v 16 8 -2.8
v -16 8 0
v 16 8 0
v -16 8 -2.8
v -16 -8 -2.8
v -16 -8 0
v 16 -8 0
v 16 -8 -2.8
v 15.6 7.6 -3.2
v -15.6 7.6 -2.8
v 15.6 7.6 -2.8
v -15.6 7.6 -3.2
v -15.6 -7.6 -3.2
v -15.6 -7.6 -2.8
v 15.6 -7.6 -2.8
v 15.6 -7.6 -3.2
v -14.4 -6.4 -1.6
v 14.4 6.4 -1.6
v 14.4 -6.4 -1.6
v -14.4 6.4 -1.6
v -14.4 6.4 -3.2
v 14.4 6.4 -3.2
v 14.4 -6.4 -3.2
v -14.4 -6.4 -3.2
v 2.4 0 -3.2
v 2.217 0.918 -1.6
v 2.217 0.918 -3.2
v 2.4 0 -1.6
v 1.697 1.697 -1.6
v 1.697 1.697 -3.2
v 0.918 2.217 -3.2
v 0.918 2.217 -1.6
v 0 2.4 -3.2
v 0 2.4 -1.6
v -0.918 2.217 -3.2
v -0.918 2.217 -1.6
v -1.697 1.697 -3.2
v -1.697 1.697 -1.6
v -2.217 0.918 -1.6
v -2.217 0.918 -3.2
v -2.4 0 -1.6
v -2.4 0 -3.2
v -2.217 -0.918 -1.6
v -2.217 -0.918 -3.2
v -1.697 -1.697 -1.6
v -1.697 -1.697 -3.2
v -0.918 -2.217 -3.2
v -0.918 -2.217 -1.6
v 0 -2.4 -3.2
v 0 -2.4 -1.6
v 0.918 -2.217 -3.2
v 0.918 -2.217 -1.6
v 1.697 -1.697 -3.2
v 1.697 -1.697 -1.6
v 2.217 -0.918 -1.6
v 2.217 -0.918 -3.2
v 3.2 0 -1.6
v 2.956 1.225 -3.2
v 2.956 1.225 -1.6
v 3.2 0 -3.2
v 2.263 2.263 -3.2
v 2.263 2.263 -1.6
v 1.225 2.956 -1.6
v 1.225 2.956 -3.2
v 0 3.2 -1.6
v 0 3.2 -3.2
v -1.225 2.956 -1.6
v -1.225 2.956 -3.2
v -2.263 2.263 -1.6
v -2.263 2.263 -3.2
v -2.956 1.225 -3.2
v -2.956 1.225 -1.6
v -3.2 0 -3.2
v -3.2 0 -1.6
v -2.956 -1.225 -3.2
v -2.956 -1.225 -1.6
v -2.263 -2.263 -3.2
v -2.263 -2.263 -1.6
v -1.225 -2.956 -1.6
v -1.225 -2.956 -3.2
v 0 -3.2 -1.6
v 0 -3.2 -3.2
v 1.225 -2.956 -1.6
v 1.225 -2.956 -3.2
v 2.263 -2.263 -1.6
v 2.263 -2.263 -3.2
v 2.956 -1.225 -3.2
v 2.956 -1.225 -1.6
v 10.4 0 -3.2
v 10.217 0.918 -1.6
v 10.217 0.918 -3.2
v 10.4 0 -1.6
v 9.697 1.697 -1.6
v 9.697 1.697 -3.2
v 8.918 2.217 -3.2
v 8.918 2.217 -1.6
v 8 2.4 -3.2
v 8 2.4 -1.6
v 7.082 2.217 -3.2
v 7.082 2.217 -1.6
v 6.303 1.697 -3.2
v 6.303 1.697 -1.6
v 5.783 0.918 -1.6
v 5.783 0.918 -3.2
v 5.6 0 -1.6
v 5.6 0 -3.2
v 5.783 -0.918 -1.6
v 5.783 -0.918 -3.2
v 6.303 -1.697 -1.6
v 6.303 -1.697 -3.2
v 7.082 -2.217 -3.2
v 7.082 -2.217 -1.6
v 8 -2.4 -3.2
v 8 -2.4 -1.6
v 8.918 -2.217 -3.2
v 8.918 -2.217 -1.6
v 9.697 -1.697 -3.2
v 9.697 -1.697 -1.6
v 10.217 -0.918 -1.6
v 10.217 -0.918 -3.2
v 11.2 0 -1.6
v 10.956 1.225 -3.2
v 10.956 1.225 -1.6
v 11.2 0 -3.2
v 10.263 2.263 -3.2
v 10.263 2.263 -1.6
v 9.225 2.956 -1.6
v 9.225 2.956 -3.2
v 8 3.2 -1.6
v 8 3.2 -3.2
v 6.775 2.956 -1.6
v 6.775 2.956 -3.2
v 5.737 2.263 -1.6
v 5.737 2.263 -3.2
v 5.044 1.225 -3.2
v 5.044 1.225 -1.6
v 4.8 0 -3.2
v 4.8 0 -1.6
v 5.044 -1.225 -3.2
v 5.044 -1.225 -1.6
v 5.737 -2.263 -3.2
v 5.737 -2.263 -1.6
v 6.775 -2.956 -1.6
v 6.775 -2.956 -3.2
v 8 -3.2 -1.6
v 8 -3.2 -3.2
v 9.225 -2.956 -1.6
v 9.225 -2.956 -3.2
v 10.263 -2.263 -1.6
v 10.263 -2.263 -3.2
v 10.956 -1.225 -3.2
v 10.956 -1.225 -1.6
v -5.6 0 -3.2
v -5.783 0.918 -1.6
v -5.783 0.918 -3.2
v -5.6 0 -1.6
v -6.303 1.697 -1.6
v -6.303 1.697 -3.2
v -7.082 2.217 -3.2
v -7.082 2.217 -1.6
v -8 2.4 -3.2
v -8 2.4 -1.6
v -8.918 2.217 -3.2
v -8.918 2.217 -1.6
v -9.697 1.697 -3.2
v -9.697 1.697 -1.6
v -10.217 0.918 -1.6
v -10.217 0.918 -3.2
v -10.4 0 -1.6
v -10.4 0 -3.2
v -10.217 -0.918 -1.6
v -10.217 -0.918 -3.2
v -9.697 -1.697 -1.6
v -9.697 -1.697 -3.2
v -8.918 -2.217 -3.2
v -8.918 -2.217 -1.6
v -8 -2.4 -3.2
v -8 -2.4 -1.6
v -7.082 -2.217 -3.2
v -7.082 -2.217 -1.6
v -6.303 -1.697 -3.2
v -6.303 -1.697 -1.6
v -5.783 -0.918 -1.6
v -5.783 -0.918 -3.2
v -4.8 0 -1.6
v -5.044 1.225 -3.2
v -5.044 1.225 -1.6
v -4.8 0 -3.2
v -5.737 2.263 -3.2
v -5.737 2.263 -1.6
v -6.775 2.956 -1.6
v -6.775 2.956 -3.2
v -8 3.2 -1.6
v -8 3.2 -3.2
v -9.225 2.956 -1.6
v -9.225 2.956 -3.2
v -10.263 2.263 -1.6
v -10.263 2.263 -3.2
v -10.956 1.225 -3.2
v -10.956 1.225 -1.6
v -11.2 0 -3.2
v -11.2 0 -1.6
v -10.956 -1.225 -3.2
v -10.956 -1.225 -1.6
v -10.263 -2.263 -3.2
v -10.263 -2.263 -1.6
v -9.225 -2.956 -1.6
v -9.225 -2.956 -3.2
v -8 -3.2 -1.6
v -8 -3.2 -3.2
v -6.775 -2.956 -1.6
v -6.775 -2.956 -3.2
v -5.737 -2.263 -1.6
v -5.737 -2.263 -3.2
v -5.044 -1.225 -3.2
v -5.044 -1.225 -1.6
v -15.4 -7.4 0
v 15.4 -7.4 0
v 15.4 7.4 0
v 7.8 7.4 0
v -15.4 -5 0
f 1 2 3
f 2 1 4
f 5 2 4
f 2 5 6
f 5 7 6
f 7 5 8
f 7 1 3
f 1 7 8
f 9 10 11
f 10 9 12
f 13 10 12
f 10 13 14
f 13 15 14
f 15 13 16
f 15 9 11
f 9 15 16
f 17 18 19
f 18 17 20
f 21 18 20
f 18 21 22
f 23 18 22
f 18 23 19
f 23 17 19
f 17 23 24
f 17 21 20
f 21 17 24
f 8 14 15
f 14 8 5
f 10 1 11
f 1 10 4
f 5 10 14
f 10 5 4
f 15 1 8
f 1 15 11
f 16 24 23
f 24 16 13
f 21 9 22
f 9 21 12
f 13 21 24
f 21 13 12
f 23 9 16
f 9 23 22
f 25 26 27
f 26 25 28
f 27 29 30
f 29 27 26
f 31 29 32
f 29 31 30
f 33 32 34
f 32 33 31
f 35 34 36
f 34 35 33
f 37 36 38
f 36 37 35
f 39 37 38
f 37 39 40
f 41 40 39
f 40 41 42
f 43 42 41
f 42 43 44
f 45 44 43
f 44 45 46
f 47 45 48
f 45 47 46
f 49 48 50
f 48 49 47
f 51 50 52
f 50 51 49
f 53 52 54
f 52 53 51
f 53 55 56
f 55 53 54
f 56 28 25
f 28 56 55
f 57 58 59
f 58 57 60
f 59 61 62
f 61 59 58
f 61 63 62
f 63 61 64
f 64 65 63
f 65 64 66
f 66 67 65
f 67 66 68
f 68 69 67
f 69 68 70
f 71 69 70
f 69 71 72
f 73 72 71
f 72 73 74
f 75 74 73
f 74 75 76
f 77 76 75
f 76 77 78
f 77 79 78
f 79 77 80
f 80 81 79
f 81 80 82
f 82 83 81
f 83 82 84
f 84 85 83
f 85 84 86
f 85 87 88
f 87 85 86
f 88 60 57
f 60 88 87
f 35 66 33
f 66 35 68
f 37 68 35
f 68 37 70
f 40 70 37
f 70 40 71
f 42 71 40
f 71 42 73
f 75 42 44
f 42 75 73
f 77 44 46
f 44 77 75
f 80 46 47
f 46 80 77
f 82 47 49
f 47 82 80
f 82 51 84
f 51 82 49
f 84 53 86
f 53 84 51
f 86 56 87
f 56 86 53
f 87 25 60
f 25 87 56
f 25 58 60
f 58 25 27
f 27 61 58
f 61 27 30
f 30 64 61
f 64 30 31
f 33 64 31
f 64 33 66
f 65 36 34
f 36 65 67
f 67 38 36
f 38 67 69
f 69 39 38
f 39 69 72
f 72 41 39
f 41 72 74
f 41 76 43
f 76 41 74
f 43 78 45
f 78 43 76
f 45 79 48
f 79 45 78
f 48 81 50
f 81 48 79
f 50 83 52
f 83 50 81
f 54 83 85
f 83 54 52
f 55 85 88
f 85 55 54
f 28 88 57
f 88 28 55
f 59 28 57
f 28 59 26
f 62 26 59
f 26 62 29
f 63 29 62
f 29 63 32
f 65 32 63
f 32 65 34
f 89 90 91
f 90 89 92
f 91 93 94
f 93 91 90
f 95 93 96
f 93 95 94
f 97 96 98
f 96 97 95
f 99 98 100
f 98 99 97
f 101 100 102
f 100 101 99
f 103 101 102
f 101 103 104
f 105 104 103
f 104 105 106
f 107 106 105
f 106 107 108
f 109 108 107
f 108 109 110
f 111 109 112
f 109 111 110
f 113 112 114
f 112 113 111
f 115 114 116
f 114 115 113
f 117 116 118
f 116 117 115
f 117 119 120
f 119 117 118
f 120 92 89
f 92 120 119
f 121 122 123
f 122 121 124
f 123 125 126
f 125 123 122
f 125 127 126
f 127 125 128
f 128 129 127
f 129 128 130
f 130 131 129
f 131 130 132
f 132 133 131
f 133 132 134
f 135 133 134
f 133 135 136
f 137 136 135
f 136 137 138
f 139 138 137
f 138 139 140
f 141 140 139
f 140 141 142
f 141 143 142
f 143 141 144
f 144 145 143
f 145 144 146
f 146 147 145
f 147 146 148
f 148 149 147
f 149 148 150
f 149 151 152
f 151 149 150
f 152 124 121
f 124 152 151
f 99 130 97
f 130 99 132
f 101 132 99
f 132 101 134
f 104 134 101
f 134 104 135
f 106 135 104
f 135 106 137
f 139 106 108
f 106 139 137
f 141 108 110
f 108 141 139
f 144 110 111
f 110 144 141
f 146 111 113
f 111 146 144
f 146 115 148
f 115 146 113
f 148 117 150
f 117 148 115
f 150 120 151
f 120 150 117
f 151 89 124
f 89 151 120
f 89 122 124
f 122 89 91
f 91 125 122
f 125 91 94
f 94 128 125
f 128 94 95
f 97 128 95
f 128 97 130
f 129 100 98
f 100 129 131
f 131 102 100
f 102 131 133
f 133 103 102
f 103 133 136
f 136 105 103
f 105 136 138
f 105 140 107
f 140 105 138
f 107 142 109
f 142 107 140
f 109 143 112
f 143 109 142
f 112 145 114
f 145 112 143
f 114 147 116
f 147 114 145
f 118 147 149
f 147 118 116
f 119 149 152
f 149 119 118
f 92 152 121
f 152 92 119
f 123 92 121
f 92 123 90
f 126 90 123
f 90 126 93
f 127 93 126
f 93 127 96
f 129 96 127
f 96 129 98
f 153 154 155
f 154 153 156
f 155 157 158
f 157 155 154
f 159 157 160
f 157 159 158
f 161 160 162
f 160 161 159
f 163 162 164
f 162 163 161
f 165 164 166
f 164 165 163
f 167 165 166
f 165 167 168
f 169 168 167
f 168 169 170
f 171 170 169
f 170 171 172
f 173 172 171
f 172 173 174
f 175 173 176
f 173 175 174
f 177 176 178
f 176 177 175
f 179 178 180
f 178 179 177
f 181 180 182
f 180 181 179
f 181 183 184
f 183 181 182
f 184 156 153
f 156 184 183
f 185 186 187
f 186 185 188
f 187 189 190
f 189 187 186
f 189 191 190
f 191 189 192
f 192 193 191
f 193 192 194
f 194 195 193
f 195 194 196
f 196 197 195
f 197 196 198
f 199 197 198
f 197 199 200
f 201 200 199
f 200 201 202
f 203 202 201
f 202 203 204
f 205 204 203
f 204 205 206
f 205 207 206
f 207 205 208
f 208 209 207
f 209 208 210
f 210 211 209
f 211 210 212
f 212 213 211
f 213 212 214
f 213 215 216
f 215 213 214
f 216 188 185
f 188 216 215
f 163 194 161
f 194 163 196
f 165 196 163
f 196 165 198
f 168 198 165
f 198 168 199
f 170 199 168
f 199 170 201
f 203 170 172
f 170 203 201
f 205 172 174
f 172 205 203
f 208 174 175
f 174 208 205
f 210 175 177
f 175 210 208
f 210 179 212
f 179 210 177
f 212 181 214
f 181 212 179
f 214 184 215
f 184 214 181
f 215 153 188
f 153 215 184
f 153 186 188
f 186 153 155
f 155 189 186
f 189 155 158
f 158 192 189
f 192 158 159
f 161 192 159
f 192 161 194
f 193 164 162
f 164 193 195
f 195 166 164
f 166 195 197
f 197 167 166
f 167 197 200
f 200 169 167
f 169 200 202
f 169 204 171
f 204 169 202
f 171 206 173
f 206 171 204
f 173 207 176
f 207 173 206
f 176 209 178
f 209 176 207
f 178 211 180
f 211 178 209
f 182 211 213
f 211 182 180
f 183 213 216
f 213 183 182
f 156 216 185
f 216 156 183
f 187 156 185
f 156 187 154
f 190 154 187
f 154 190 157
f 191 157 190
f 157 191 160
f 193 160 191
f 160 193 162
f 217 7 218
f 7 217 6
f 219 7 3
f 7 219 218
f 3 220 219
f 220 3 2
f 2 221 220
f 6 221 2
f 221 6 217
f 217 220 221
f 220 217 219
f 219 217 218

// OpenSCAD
// file: ../p/4-4ring3.scad
use <../lib.scad>
$fa=1; $fs=0.2;
function ldraw_lib__4_4ring3(realsolid=false) = [
// 0 Ring  3 x 1.0
// 0 Name: 4-4ring3.dat
// 0 Author: James Jessiman
// 0 !LDRAW_ORG Primitive UPDATE 2009-01
// 0 !LICENSE Licensed under CC BY 2.0 and CC BY 4.0 : see CAreadme.txt
// 
// 0 BFC CERTIFY CCW
  [0,"BFC","CERTIFY"],
  [0,"BFC","CCW"],
// 
// 0 !HISTORY 1998-12-15 [PTadmin] Official Update 1998-10
// 0 !HISTORY 2002-04-05 [hafhead] Added BFC statement
// 0 !HISTORY 2002-04-25 [PTadmin] Official Update 2002-02
// 0 !HISTORY 2007-06-24 [PTadmin] Header formatted for Contributor Agreement
// 0 !HISTORY 2008-07-01 [PTadmin] Official Update 2008-01
// 0 !HISTORY 2008-08-26 [cwdee] Switch polygon winding and rename
// 0 !HISTORY 2009-05-02 [PTadmin] Official Update 2009-01
// 
// 
// 4 16 -1.5308 0 3.6956 -1.1481 0 2.7717 0 0 3 0 0 4
  [4,16,-1.5308,0,3.6956,-1.1481,0,2.7717,0,0,3,0,0,4],
// 4 16 -2.8284 0 2.8284 -2.1213 0 2.1213 -1.1481 0 2.7717 -1.5308 0 3.6956
  [4,16,-2.8284,0,2.8284,-2.1213,0,2.1213,-1.1481,0,2.7717,-1.5308,0,3.6956],
// 4 16 -3.6956 0 1.5308 -2.7717 0 1.1481 -2.1213 0 2.1213 -2.8284 0 2.8284
  [4,16,-3.6956,0,1.5308,-2.7717,0,1.1481,-2.1213,0,2.1213,-2.8284,0,2.8284],
// 4 16 -4 0 0 -3 0 0 -2.7717 0 1.1481 -3.6956 0 1.5308
  [4,16,-4,0,0,-3,0,0,-2.7717,0,1.1481,-3.6956,0,1.5308],
// 4 16 -3.6956 0 -1.5308 -2.7717 0 -1.1481 -3 0 0 -4 0 0
  [4,16,-3.6956,0,-1.5308,-2.7717,0,-1.1481,-3,0,0,-4,0,0],
// 4 16 -2.8284 0 -2.8284 -2.1213 0 -2.1213 -2.7717 0 -1.1481 -3.6956 0 -1.5308
  [4,16,-2.8284,0,-2.8284,-2.1213,0,-2.1213,-2.7717,0,-1.1481,-3.6956,0,-1.5308],
// 4 16 -1.5308 0 -3.6956 -1.1481 0 -2.7717 -2.1213 0 -2.1213 -2.8284 0 -2.8284
  [4,16,-1.5308,0,-3.6956,-1.1481,0,-2.7717,-2.1213,0,-2.1213,-2.8284,0,-2.8284],
// 4 16 0 0 -4 0 0 -3 -1.1481 0 -2.7717 -1.5308 0 -3.6956
  [4,16,0,0,-4,0,0,-3,-1.1481,0,-2.7717,-1.5308,0,-3.6956],
// 4 16 1.5308 0 -3.6956 1.1481 0 -2.7717 0 0 -3 0 0 -4
  [4,16,1.5308,0,-3.6956,1.1481,0,-2.7717,0,0,-3,0,0,-4],
// 4 16 2.8284 0 -2.8284 2.1213 0 -2.1213 1.1481 0 -2.7717 1.5308 0 -3.6956
  [4,16,2.8284,0,-2.8284,2.1213,0,-2.1213,1.1481,0,-2.7717,1.5308,0,-3.6956],
// 4 16 3.6956 0 -1.5308 2.7717 0 -1.1481 2.1213 0 -2.1213 2.8284 0 -2.8284
  [4,16,3.6956,0,-1.5308,2.7717,0,-1.1481,2.1213,0,-2.1213,2.8284,0,-2.8284],
// 4 16 4 0 0 3 0 0 2.7717 0 -1.1481 3.6956 0 -1.5308
  [4,16,4,0,0,3,0,0,2.7717,0,-1.1481,3.6956,0,-1.5308],
// 4 16 3.6956 0 1.5308 2.7717 0 1.1481 3 0 0 4 0 0
  [4,16,3.6956,0,1.5308,2.7717,0,1.1481,3,0,0,4,0,0],
// 4 16 2.8284 0 2.8284 2.1213 0 2.1213 2.7717 0 1.1481 3.6956 0 1.5308
  [4,16,2.8284,0,2.8284,2.1213,0,2.1213,2.7717,0,1.1481,3.6956,0,1.5308],
// 4 16 1.5308 0 3.6956 1.1481 0 2.7717 2.1213 0 2.1213 2.8284 0 2.8284
  [4,16,1.5308,0,3.6956,1.1481,0,2.7717,2.1213,0,2.1213,2.8284,0,2.8284],
// 4 16 0 0 4 0 0 3 1.1481 0 2.7717 1.5308 0 3.6956
  [4,16,0,0,4,0,0,3,1.1481,0,2.7717,1.5308,0,3.6956],
// 0
];
module ldraw_lib__4_4ring3(step=0, col=false, unit=2/5, alt=false, line=0.2, solid=!$preview)
    makepoly(ldraw_lib__4_4ring3(solid), step=step, col=col, unit=unit, alt=alt, line=line, solid=solid);
ldraw_lib__4_4ring3(line=0.2);
// file: ../p/4-4edge.scad
use <../lib.scad>
function ldraw_lib__4_4edge() = [
// 0 Circle 1.0
// 0 Name: 4-4edge.dat
// 0 Author: James Jessiman
// 0 !LDRAW_ORG Primitive UPDATE 2017-01
// 0 !LICENSE Licensed under CC BY 2.0 and CC BY 4.0 : see CAreadme.txt
// 
// 0 BFC CERTIFY CCW
  [0,"BFC","CERTIFY"],
  [0,"BFC","CCW"],
// 
// 0 !HISTORY 1998-12-15 [PTadmin] Official Update 1998-10
// 0 !HISTORY 2005-12-28 [PTadmin] Official Update 2005-01
// 0 !HISTORY 2007-06-24 [PTadmin] Header formatted for Contributor Agreement
// 0 !HISTORY 2008-07-01 [PTadmin] Official Update 2008-01
// 0 !HISTORY 2017-01-15 [Steffen] BFCed
// 0 !HISTORY 2017-12-30 [PTadmin] Official Update 2017-01
// 
// 
// 2 24 1 0 0 0.9239 0 0.3827
  [2,24,1,0,0,0.9239,0,0.3827],
// 2 24 0.9239 0 0.3827 0.7071 0 0.7071
  [2,24,0.9239,0,0.3827,0.7071,0,0.7071],
// 2 24 0.7071 0 0.7071 0.3827 0 0.9239
  [2,24,0.7071,0,0.7071,0.3827,0,0.9239],
// 2 24 0.3827 0 0.9239 0 0 1
  [2,24,0.3827,0,0.9239,0,0,1],
// 2 24 0 0 1 -0.3827 0 0.9239
  [2,24,0,0,1,-0.3827,0,0.9239],
// 2 24 -0.3827 0 0.9239 -0.7071 0 0.7071
  [2,24,-0.3827,0,0.9239,-0.7071,0,0.7071],
// 2 24 -0.7071 0 0.7071 -0.9239 0 0.3827
  [2,24,-0.7071,0,0.7071,-0.9239,0,0.3827],
// 2 24 -0.9239 0 0.3827 -1 0 -0
  [2,24,-0.9239,0,0.3827,-1,0,-0],
// 2 24 -1 0 -0 -0.9239 0 -0.3827
  [2,24,-1,0,-0,-0.9239,0,-0.3827],
// 2 24 -0.9239 0 -0.3827 -0.7071 0 -0.7071
  [2,24,-0.9239,0,-0.3827,-0.7071,0,-0.7071],
// 2 24 -0.7071 0 -0.7071 -0.3827 0 -0.9239
  [2,24,-0.7071,0,-0.7071,-0.3827,0,-0.9239],
// 2 24 -0.3827 0 -0.9239 0 0 -1
  [2,24,-0.3827,0,-0.9239,0,0,-1],
// 2 24 0 0 -1 0.3827 0 -0.9239
  [2,24,0,0,-1,0.3827,0,-0.9239],
// 2 24 0.3827 0 -0.9239 0.7071 0 -0.7071
  [2,24,0.3827,0,-0.9239,0.7071,0,-0.7071],
// 2 24 0.7071 0 -0.7071 0.9239 0 -0.3827
  [2,24,0.7071,0,-0.7071,0.9239,0,-0.3827],
// 2 24 0.9239 0 -0.3827 1 0 0
  [2,24,0.9239,0,-0.3827,1,0,0],
];
module ldraw_lib__4_4edge(step=0, col=false, unit=2/5, alt=false, line=0.2, solid=!$preview)
    makepoly(ldraw_lib__4_4edge(), step=step, col=col, unit=unit, alt=alt, line=line, solid=solid);
ldraw_lib__4_4edge(line=0.2);
// file: ../p/4-4cyli.scad
use <../lib.scad>
$fa=1; $fs=0.2;
function ldraw_lib__4_4cyli(realsolid=false) = [
// 0 Cylinder 1.0
// 0 Name: 4-4cyli.dat
// 0 Author: James Jessiman
// 0 !LDRAW_ORG Primitive UPDATE 2005-01
// 0 !LICENSE Licensed under CC BY 2.0 and CC BY 4.0 : see CAreadme.txt
// 
// 0 BFC CERTIFY CCW
  [0,"BFC","CERTIFY"],
  [0,"BFC","CCW"],
// 
// 0 !HISTORY 1998-12-15 [PTadmin] Official Update 1998-10
// 0 !HISTORY 2002-03-23 [sbliss] Added BFC statement; merged headers from files in distributions LDraw 0.27 and Complete.
// 0 !HISTORY 2002-04-25 [PTadmin] Official Update 2002-02
// 0 !HISTORY 2004-12-14 [guyvivan] BFC CCW
// 0 !HISTORY 2005-12-28 [PTadmin] Official Update 2005-01
// 0 !HISTORY 2007-06-24 [PTadmin] Header formatted for Contributor Agreement
// 0 !HISTORY 2008-07-01 [PTadmin] Official Update 2008-01
// 
// 
// 4 16 1 1 0 0.9239 1 0.3827 0.9239 0 0.3827 1 0 0
  [4,16,1,1,0,0.9239,1,0.3827,0.9239,0,0.3827,1,0,0],
// 5 24 1 0 0 1 1 0 0.9239 0 0.3827 0.9239 0 -0.3827
  [5,24,1,0,0,1,1,0,0.9239,0,0.3827,0.9239,0,-0.3827],
// 4 16 0.9239 1 0.3827 0.7071 1 0.7071 0.7071 0 0.7071 0.9239 0 0.3827
  [4,16,0.9239,1,0.3827,0.7071,1,0.7071,0.7071,0,0.7071,0.9239,0,0.3827],
// 5 24 0.9239 0 0.3827 0.9239 1 0.3827 0.7071 0 0.7071 1 0 0
  [5,24,0.9239,0,0.3827,0.9239,1,0.3827,0.7071,0,0.7071,1,0,0],
// 4 16 0.7071 1 0.7071 0.3827 1 0.9239 0.3827 0 0.9239 0.7071 0 0.7071
  [4,16,0.7071,1,0.7071,0.3827,1,0.9239,0.3827,0,0.9239,0.7071,0,0.7071],
// 5 24 0.7071 0 0.7071 0.7071 1 0.7071 0.3827 0 0.9239 0.9239 0 0.3827
  [5,24,0.7071,0,0.7071,0.7071,1,0.7071,0.3827,0,0.9239,0.9239,0,0.3827],
// 4 16 0.3827 1 0.9239 0 1 1 0 0 1 0.3827 0 0.9239
  [4,16,0.3827,1,0.9239,0,1,1,0,0,1,0.3827,0,0.9239],
// 5 24 0.3827 0 0.9239 0.3827 1 0.9239 0 0 1 0.7071 0 0.7071
  [5,24,0.3827,0,0.9239,0.3827,1,0.9239,0,0,1,0.7071,0,0.7071],
// 4 16 0 1 1 -0.3827 1 0.9239 -0.3827 0 0.9239 0 0 1
  [4,16,0,1,1,-0.3827,1,0.9239,-0.3827,0,0.9239,0,0,1],
// 5 24 0 0 1 0 1 1 -0.3827 0 0.9239 0.3827 0 0.9239
  [5,24,0,0,1,0,1,1,-0.3827,0,0.9239,0.3827,0,0.9239],
// 4 16 -0.3827 1 0.9239 -0.7071 1 0.7071 -0.7071 0 0.7071 -0.3827 0 0.9239
  [4,16,-0.3827,1,0.9239,-0.7071,1,0.7071,-0.7071,0,0.7071,-0.3827,0,0.9239],
// 5 24 -0.3827 0 0.9239 -0.3827 1 0.9239 -0.7071 0 0.7071 0 0 1
  [5,24,-0.3827,0,0.9239,-0.3827,1,0.9239,-0.7071,0,0.7071,0,0,1],
// 4 16 -0.7071 1 0.7071 -0.9239 1 0.3827 -0.9239 0 0.3827 -0.7071 0 0.7071
  [4,16,-0.7071,1,0.7071,-0.9239,1,0.3827,-0.9239,0,0.3827,-0.7071,0,0.7071],
// 5 24 -0.7071 0 0.7071 -0.7071 1 0.7071 -0.9239 0 0.3827 -0.3827 0 0.9239
  [5,24,-0.7071,0,0.7071,-0.7071,1,0.7071,-0.9239,0,0.3827,-0.3827,0,0.9239],
// 4 16 -0.9239 1 0.3827 -1 1 0 -1 0 0 -0.9239 0 0.3827
  [4,16,-0.9239,1,0.3827,-1,1,0,-1,0,0,-0.9239,0,0.3827],
// 5 24 -0.9239 0 0.3827 -0.9239 1 0.3827 -1 0 0 -0.7071 0 0.7071
  [5,24,-0.9239,0,0.3827,-0.9239,1,0.3827,-1,0,0,-0.7071,0,0.7071],
// 4 16 -1 1 0 -0.9239 1 -0.3827 -0.9239 0 -0.3827 -1 0 0
  [4,16,-1,1,0,-0.9239,1,-0.3827,-0.9239,0,-0.3827,-1,0,0],
// 5 24 -1 0 0 -1 1 0 -0.9239 0 -0.3827 -0.9239 0 0.3827
  [5,24,-1,0,0,-1,1,0,-0.9239,0,-0.3827,-0.9239,0,0.3827],
// 4 16 -0.9239 1 -0.3827 -0.7071 1 -0.7071 -0.7071 0 -0.7071 -0.9239 0 -0.3827
  [4,16,-0.9239,1,-0.3827,-0.7071,1,-0.7071,-0.7071,0,-0.7071,-0.9239,0,-0.3827],
// 5 24 -0.9239 0 -0.3827 -0.9239 1 -0.3827 -0.7071 0 -0.7071 -1 0 0
  [5,24,-0.9239,0,-0.3827,-0.9239,1,-0.3827,-0.7071,0,-0.7071,-1,0,0],
// 4 16 -0.7071 1 -0.7071 -0.3827 1 -0.9239 -0.3827 0 -0.9239 -0.7071 0 -0.7071
  [4,16,-0.7071,1,-0.7071,-0.3827,1,-0.9239,-0.3827,0,-0.9239,-0.7071,0,-0.7071],
// 5 24 -0.7071 0 -0.7071 -0.7071 1 -0.7071 -0.3827 0 -0.9239 -0.9239 0 -0.3827
  [5,24,-0.7071,0,-0.7071,-0.7071,1,-0.7071,-0.3827,0,-0.9239,-0.9239,0,-0.3827],
// 4 16 -0.3827 1 -0.9239 0 1 -1 0 0 -1 -0.3827 0 -0.9239
  [4,16,-0.3827,1,-0.9239,0,1,-1,0,0,-1,-0.3827,0,-0.9239],
// 5 24 -0.3827 0 -0.9239 -0.3827 1 -0.9239 0 0 -1 -0.7071 0 -0.7071
  [5,24,-0.3827,0,-0.9239,-0.3827,1,-0.9239,0,0,-1,-0.7071,0,-0.7071],
// 4 16 0 1 -1 0.3827 1 -0.9239 0.3827 0 -0.9239 0 0 -1
  [4,16,0,1,-1,0.3827,1,-0.9239,0.3827,0,-0.9239,0,0,-1],
// 5 24 0 0 -1 0 1 -1 0.3827 0 -0.9239 -0.3827 0 -0.9239
  [5,24,0,0,-1,0,1,-1,0.3827,0,-0.9239,-0.3827,0,-0.9239],
// 4 16 0.3827 1 -0.9239 0.7071 1 -0.7071 0.7071 0 -0.7071 0.3827 0 -0.9239
  [4,16,0.3827,1,-0.9239,0.7071,1,-0.7071,0.7071,0,-0.7071,0.3827,0,-0.9239],
// 5 24 0.3827 0 -0.9239 0.3827 1 -0.9239 0.7071 0 -0.7071 0 0 -1
  [5,24,0.3827,0,-0.9239,0.3827,1,-0.9239,0.7071,0,-0.7071,0,0,-1],
// 4 16 0.7071 1 -0.7071 0.9239 1 -0.3827 0.9239 0 -0.3827 0.7071 0 -0.7071
  [4,16,0.7071,1,-0.7071,0.9239,1,-0.3827,0.9239,0,-0.3827,0.7071,0,-0.7071],
// 5 24 0.7071 0 -0.7071 0.7071 1 -0.7071 0.9239 0 -0.3827 0.3827 0 -0.9239
  [5,24,0.7071,0,-0.7071,0.7071,1,-0.7071,0.9239,0,-0.3827,0.3827,0,-0.9239],
// 4 16 0.9239 1 -0.3827 1 1 0 1 0 0 0.9239 0 -0.3827
  [4,16,0.9239,1,-0.3827,1,1,0,1,0,0,0.9239,0,-0.3827],
// 5 24 0.9239 0 -0.3827 0.9239 1 -0.3827 1 0 0 0.7071 0 -0.7071
  [5,24,0.9239,0,-0.3827,0.9239,1,-0.3827,1,0,0,0.7071,0,-0.7071],
// 0
];
module ldraw_lib__4_4cyli(step=0, col=false, unit=2/5, alt=false, line=0.2, solid=!$preview)
    makepoly(ldraw_lib__4_4cyli(solid), step=step, col=col, unit=unit, alt=alt, line=line, solid=solid);
ldraw_lib__4_4cyli(line=0.2);
// file: ../p/stud4.scad
use <../lib.scad>
use <4-4cyli.scad>
use <4-4edge.scad>
use <4-4ring3.scad>
function ldraw_lib__stud4() = [
// 0 Stud Tube Open
// 0 Name: stud4.dat
// 0 Author: James Jessiman
// 0 !LDRAW_ORG Primitive UPDATE 2009-02
// 0 !LICENSE Licensed under CC BY 4.0 : see CAreadme.txt
// 
// 0 BFC CERTIFY CCW
  [0,"BFC","CERTIFY"],
  [0,"BFC","CCW"],
// 
// 0 !HISTORY 1999-07-05 [PTadmin] Official Update 1999-05
// 0 !HISTORY 2002-04-04 [sbliss] Modified for BFC compliance
// 0 !HISTORY 2002-04-25 [PTadmin] Official Update 2002-02
// 0 !HISTORY 2007-06-24 [PTadmin] Header formatted for Contributor Agreement
// 0 !HISTORY 2008-07-01 [PTadmin] Official Update 2008-01
// 0 !HISTORY 2009-06-21 [cwdee] Update ring references to 4-4ring
// 0 !HISTORY 2009-09-03 [PTadmin] Official Update 2009-02
// 
// 
// 1 16 0 -4 0 6 0 0 0 1 0 0 0 6 4-4edge.dat
  [1,16,0,-4,0,6,0,0,0,1,0,0,0,6, ldraw_lib__4_4edge()],
// 1 16 0 -4 0 8 0 0 0 1 0 0 0 8 4-4edge.dat
  [1,16,0,-4,0,8,0,0,0,1,0,0,0,8, ldraw_lib__4_4edge()],
// 1 16 0 0 0 6 0 0 0 1 0 0 0 6 4-4edge.dat
  [1,16,0,0,0,6,0,0,0,1,0,0,0,6, ldraw_lib__4_4edge()],
// 1 16 0 0 0 8 0 0 0 1 0 0 0 8 4-4edge.dat
  [1,16,0,0,0,8,0,0,0,1,0,0,0,8, ldraw_lib__4_4edge()],
// 0 BFC INVERTNEXT
  [0,"BFC","INVERTNEXT"],
// 1 16 0 -4 0 6 0 0 0 4 0 0 0 6 4-4cyli.dat
  [1,16,0,-4,0,6,0,0,0,4,0,0,0,6, ldraw_lib__4_4cyli()],
// 1 16 0 -4 0 8 0 0 0 4 0 0 0 8 4-4cyli.dat
  [1,16,0,-4,0,8,0,0,0,4,0,0,0,8, ldraw_lib__4_4cyli()],
// 1 16 0 -4 0 2 0 0 0 1 0 0 0 2 4-4ring3.dat
  [1,16,0,-4,0,2,0,0,0,1,0,0,0,2, ldraw_lib__4_4ring3()],
  [-1,16,0,0,0,2,0,0,0,-1,0,0,0,2, ldraw_lib__4_4ring3()],
// 0
];
module ldraw_lib__stud4(step=0, col=false, unit=2/5, alt=false, line=0.2, solid=!$preview)
    makepoly(ldraw_lib__stud4(), step=step, col=col, unit=unit, alt=alt, line=line, solid=solid);
ldraw_lib__stud4(line=0.2);
// file: ../p/box5.scad
use <../lib.scad>
function ldraw_lib__box5() = [
// 0 Box with 5 Faces and All Edges
// 0 Name: box5.dat
// 0 Author: James Jessiman
// 0 !LDRAW_ORG Primitive UPDATE 2012-01
// 0 !LICENSE Licensed under CC BY 2.0 and CC BY 4.0 : see CAreadme.txt
// 
// 0 BFC CERTIFY CCW
  [0,"BFC","CERTIFY"],
  [0,"BFC","CCW"],
// 
// 0 !HISTORY 2002-04-03 [sbliss] Modified for BFC compliance
// 0 !HISTORY 2002-04-25 [PTadmin] Official Update 2002-02
// 0 !HISTORY 2007-06-24 [PTadmin] Header formatted for Contributor Agreement
// 0 !HISTORY 2008-07-01 [PTadmin] Official Update 2008-01
// 0 !HISTORY 2012-02-16 [Philo] Changed to CCW
// 0 !HISTORY 2012-03-30 [PTadmin] Official Update 2012-01
// 
// 
// 2 24 1 1 1 -1 1 1
  [2,24,1,1,1,-1,1,1],
// 2 24 -1 1 1 -1 1 -1
  [2,24,-1,1,1,-1,1,-1],
// 2 24 -1 1 -1 1 1 -1
  [2,24,-1,1,-1,1,1,-1],
// 2 24 1 1 -1 1 1 1
  [2,24,1,1,-1,1,1,1],
// 2 24 1 0 1 -1 0 1
  [2,24,1,0,1,-1,0,1],
// 2 24 -1 0 1 -1 0 -1
  [2,24,-1,0,1,-1,0,-1],
// 2 24 -1 0 -1 1 0 -1
  [2,24,-1,0,-1,1,0,-1],
// 2 24 1 0 -1 1 0 1
  [2,24,1,0,-1,1,0,1],
// 2 24 1 0 1 1 1 1
  [2,24,1,0,1,1,1,1],
// 2 24 -1 0 1 -1 1 1
  [2,24,-1,0,1,-1,1,1],
// 2 24 1 0 -1 1 1 -1
  [2,24,1,0,-1,1,1,-1],
// 2 24 -1 0 -1 -1 1 -1
  [2,24,-1,0,-1,-1,1,-1],
// 4 16 -1 1 1 1 1 1 1 1 -1 -1 1 -1
  [4,16,-1,1,1,1,1,1,1,1,-1,-1,1,-1],
// 4 16 -1 1 1 -1 0 1 1 0 1 1 1 1
  [4,16,-1,1,1,-1,0,1,1,0,1,1,1,1],
// 4 16 -1 1 -1 -1 0 -1 -1 0 1 -1 1 1
  [4,16,-1,1,-1,-1,0,-1,-1,0,1,-1,1,1],
// 4 16 1 1 -1 1 0 -1 -1 0 -1 -1 1 -1
  [4,16,1,1,-1,1,0,-1,-1,0,-1,-1,1,-1],
// 4 16 1 1 1 1 0 1 1 0 -1 1 1 -1
  [4,16,1,1,1,1,0,1,1,0,-1,1,1,-1],
];
makepoly(ldraw_lib__box5(), line=0.2);
// file: ../p/box4.scad
use <../lib.scad>
function ldraw_lib__box4() = [
// 0 Box with 4 Faces (2 Parallel Pairs) and All Edges
// 0 Name: box4.dat
// 0 Author: James Jessiman
// 0 !LDRAW_ORG Primitive UPDATE 2012-01
// 0 !LICENSE Licensed under CC BY 4.0 : see CAreadme.txt
// 
// 0 BFC CERTIFY CCW
  [0,"BFC","CERTIFY"],
  [0,"BFC","CCW"],
// 
// 0 !HISTORY 2002-04-03 [sbliss] Modified for BFC compliance
// 0 !HISTORY 2002-04-25 [PTadmin] Official Update 2002-02
// 0 !HISTORY 2007-06-24 [PTadmin] Header formatted for Contributor Agreement
// 0 !HISTORY 2008-07-01 [PTadmin] Official Update 2008-01
// 0 !HISTORY 2012-02-16 [Philo] Changed to CCW
// 0 !HISTORY 2012-03-30 [PTadmin] Official Update 2012-01
// 
// 
// 2 24 1 1 1 -1 1 1
  [2,24,1,1,1,-1,1,1],
// 2 24 -1 1 1 -1 1 -1
  [2,24,-1,1,1,-1,1,-1],
// 2 24 -1 1 -1 1 1 -1
  [2,24,-1,1,-1,1,1,-1],
// 2 24 1 1 -1 1 1 1
  [2,24,1,1,-1,1,1,1],
// 2 24 1 0 1 -1 0 1
  [2,24,1,0,1,-1,0,1],
// 2 24 -1 0 1 -1 0 -1
  [2,24,-1,0,1,-1,0,-1],
// 2 24 -1 0 -1 1 0 -1
  [2,24,-1,0,-1,1,0,-1],
// 2 24 1 0 -1 1 0 1
  [2,24,1,0,-1,1,0,1],
// 2 24 1 0 1 1 1 1
  [2,24,1,0,1,1,1,1],
// 2 24 -1 0 1 -1 1 1
  [2,24,-1,0,1,-1,1,1],
// 2 24 1 0 -1 1 1 -1
  [2,24,1,0,-1,1,1,-1],
// 2 24 -1 0 -1 -1 1 -1
  [2,24,-1,0,-1,-1,1,-1],
// 4 16 -1 1 1 -1 0 1 1 0 1 1 1 1
  [4,16,-1,1,1,-1,0,1,1,0,1,1,1,1],
// 4 16 -1 1 -1 -1 0 -1 -1 0 1 -1 1 1
  [4,16,-1,1,-1,-1,0,-1,-1,0,1,-1,1,1],
// 4 16 1 1 -1 1 0 -1 -1 0 -1 -1 1 -1
  [4,16,1,1,-1,1,0,-1,-1,0,-1,-1,1,-1],
// 4 16 1 1 1 1 0 1 1 0 -1 1 1 -1
  [4,16,1,1,1,1,0,1,1,0,-1,1,1,-1],
];
module ldraw_lib__box4(step=0, col=false, unit=2/5, alt=false, line=0.2, solid=!$preview)
    makepoly(ldraw_lib__box4(), step=step, col=col, unit=unit, alt=alt, line=line, solid=solid);
ldraw_lib__box4(line=0.2);
// file: s/87079s01.scad
use <../../lib.scad>
use <../../p/box4.scad>
use <../../p/box5.scad>
use <../../p/stud4.scad>
function ldraw_lib__s__87079s01() = [
// 0 ~Tile  2 x  4 without Top Surface
// 0 Name: s\87079s01.dat
// 0 Author: Philippe Hurbain [Philo]
// 0 !LDRAW_ORG Subpart UPDATE 2025-04
// 0 !LICENSE Licensed under CC BY 4.0 : see CAreadme.txt
// 
// 0 BFC CERTIFY CCW
  [0,"BFC","CERTIFY"],
  [0,"BFC","CCW"],
// 
// 0 !HISTORY 2012-09-30 [Philo] Subparted from Tim Gould's original design
// 0 !HISTORY 2012-12-28 [PTadmin] Official Update 2012-03
// 0 !HISTORY 2025-04-25 [MagFors] Update description
// 0 !HISTORY 2025-04-27 [OrionP] Official Update 2025-04
// 
// 1 16 0 0 0 40 0 0 0 7 0 0 0 20 box4.dat
  [1,16,0,0,0,40,0,0,0,7,0,0,0,20, ldraw_lib__box4()],
// 1 16 0 7 0 39 0 0 0 1 0 0 0 19 box4.dat
  [1,16,0,7,0,39,0,0,0,1,0,0,0,19, ldraw_lib__box4()],
// 0 BFC INVERTNEXT
  [0,"BFC","INVERTNEXT"],
// 1 16 0 8 0 -36 0 0 0 -4 0 0 0 16 box5.dat
  [1,16,0,8,0,-36,0,0,0,-4,0,0,0,16, ldraw_lib__box5()],
// 4 16 -40 7 -20 -39 7 -19 39 7 -19 40 7 -20
  [4,16,-40,7,-20,-39,7,-19,39,7,-19,40,7,-20],
// 4 16 40 7 20 39 7 19 -39 7 19 -40 7 20
  [4,16,40,7,20,39,7,19,-39,7,19,-40,7,20],
// 4 16 -40 7 -20 -40 7 20 -39 7 19 -39 7 -19
  [4,16,-40,7,-20,-40,7,20,-39,7,19,-39,7,-19],
// 4 16 40 7 20 40 7 -20 39 7 -19 39 7 19
  [4,16,40,7,20,40,7,-20,39,7,-19,39,7,19],
// 4 16 -39 8 -19 -36 8 -16 36 8 -16 39 8 -19
  [4,16,-39,8,-19,-36,8,-16,36,8,-16,39,8,-19],
// 4 16 39 8 19 36 8 16 -36 8 16 -39 8 19
  [4,16,39,8,19,36,8,16,-36,8,16,-39,8,19],
// 4 16 -39 8 -19 -39 8 19 -36 8 16 -36 8 -16
  [4,16,-39,8,-19,-39,8,19,-36,8,16,-36,8,-16],
// 4 16 39 8 19 39 8 -19 36 8 -16 36 8 16
  [4,16,39,8,19,39,8,-19,36,8,-16,36,8,16],
// 1 16 0 4 0 1 0 0 0 -1 0 0 0 1 stud4.dat
  [1,16,0,4,0,1,0,0,0,-1,0,0,0,1, ldraw_lib__stud4()],
// 1 16 20 4 0 1 0 0 0 -1 0 0 0 1 stud4.dat
  [1,16,20,4,0,1,0,0,0,-1,0,0,0,1, ldraw_lib__stud4()],
// 1 16 -20 4 0 1 0 0 0 -1 0 0 0 1 stud4.dat
  [1,16,-20,4,0,1,0,0,0,-1,0,0,0,1, ldraw_lib__stud4()],
];
module ldraw_lib__s__87079s01(step=0, col=false, unit=2/5, alt=false, line=0.2, solid=!$preview)
    makepoly(ldraw_lib__s__87079s01(), step=step, col=col, unit=unit, alt=alt, line=line, solid=solid);
ldraw_lib__s__87079s01(line=0.2);
// main file
use <../lib.scad>
use <s/87079s01.scad>
function ldraw_lib__87079px4() = [
// 0 Tile  2 x  4 with Black Triangle on Bottom Right and Red Diagonal Stripe Pattern
// 0 Name: 87079px4.dat
// 0 Author: Gerald Lasser [GeraldLasser]
// 0 !LDRAW_ORG Part UPDATE 2020-03
// 0 !LICENSE Licensed under CC BY 4.0 : see CAreadme.txt
// 
// 0 BFC CERTIFY CCW
  [0,"BFC","CERTIFY"],
  [0,"BFC","CCW"],
// 
// 0 !KEYWORDS A-Team, BrickLink 87079pb0343L, Lego Dimensions
// 0 !KEYWORDS Rebrickable 87079pr0095, Set 71251
// 
// 0 !HISTORY 2020-12-29 [PTadmin] Official Update 2020-03
// 
// 
// 1 16 0 0 0 1 0 0 0 1 0 0 0 1 s\87079s01.dat
  [1,16,0,0,0,1,0,0,0,1,0,0,0,1, ldraw_lib__s__87079s01()],
// 
// 4 16 38.5 0 -18.5 -38.5 0 -18.5 -40 0 -20 40 0 -20
  [4,16,38.5,0,-18.5,-38.5,0,-18.5,-40,0,-20,40,0,-20],
// 4 16 38.5 0 -18.5 40 0 -20 40 0 20 38.5 0 18.5
  [4,16,38.5,0,-18.5,40,0,-20,40,0,20,38.5,0,18.5],
// 4 16 19.5 0 18.5 38.5 0 18.5 40 0 20 -40 0 20
  [4,16,19.5,0,18.5,38.5,0,18.5,40,0,20,-40,0,20],
// 3 16 -40 0 20 -38.5 0 -12.5 19.5 0 18.5
  [3,16,-40,0,20,-38.5,0,-12.5,19.5,0,18.5],
// 4 16 -38.5 0 -12.5 -40 0 20 -40 0 -20 -38.5 0 -18.5
  [4,16,-38.5,0,-12.5,-40,0,20,-40,0,-20,-38.5,0,-18.5],
// 4 4 19.5 0 18.5 -38.5 0 -12.5 -38.5 0 -18.5 38.5 0 18.5
  [4,4,19.5,0,18.5,-38.5,0,-12.5,-38.5,0,-18.5,38.5,0,18.5],
// 3 0 38.5 0 18.5 -38.5 0 -18.5 38.5 0 -18.5
  [3,0,38.5,0,18.5,-38.5,0,-18.5,38.5,0,-18.5],
];
module ldraw_lib__87079px4(step=0, col=false, unit=2/5, alt=false, line=0.2, solid=!$preview)
    makepoly(ldraw_lib__87079px4(), step=step, col=col, unit=unit, alt=alt, line=line, solid=solid);
ldraw_lib__87079px4(line=0.2);
